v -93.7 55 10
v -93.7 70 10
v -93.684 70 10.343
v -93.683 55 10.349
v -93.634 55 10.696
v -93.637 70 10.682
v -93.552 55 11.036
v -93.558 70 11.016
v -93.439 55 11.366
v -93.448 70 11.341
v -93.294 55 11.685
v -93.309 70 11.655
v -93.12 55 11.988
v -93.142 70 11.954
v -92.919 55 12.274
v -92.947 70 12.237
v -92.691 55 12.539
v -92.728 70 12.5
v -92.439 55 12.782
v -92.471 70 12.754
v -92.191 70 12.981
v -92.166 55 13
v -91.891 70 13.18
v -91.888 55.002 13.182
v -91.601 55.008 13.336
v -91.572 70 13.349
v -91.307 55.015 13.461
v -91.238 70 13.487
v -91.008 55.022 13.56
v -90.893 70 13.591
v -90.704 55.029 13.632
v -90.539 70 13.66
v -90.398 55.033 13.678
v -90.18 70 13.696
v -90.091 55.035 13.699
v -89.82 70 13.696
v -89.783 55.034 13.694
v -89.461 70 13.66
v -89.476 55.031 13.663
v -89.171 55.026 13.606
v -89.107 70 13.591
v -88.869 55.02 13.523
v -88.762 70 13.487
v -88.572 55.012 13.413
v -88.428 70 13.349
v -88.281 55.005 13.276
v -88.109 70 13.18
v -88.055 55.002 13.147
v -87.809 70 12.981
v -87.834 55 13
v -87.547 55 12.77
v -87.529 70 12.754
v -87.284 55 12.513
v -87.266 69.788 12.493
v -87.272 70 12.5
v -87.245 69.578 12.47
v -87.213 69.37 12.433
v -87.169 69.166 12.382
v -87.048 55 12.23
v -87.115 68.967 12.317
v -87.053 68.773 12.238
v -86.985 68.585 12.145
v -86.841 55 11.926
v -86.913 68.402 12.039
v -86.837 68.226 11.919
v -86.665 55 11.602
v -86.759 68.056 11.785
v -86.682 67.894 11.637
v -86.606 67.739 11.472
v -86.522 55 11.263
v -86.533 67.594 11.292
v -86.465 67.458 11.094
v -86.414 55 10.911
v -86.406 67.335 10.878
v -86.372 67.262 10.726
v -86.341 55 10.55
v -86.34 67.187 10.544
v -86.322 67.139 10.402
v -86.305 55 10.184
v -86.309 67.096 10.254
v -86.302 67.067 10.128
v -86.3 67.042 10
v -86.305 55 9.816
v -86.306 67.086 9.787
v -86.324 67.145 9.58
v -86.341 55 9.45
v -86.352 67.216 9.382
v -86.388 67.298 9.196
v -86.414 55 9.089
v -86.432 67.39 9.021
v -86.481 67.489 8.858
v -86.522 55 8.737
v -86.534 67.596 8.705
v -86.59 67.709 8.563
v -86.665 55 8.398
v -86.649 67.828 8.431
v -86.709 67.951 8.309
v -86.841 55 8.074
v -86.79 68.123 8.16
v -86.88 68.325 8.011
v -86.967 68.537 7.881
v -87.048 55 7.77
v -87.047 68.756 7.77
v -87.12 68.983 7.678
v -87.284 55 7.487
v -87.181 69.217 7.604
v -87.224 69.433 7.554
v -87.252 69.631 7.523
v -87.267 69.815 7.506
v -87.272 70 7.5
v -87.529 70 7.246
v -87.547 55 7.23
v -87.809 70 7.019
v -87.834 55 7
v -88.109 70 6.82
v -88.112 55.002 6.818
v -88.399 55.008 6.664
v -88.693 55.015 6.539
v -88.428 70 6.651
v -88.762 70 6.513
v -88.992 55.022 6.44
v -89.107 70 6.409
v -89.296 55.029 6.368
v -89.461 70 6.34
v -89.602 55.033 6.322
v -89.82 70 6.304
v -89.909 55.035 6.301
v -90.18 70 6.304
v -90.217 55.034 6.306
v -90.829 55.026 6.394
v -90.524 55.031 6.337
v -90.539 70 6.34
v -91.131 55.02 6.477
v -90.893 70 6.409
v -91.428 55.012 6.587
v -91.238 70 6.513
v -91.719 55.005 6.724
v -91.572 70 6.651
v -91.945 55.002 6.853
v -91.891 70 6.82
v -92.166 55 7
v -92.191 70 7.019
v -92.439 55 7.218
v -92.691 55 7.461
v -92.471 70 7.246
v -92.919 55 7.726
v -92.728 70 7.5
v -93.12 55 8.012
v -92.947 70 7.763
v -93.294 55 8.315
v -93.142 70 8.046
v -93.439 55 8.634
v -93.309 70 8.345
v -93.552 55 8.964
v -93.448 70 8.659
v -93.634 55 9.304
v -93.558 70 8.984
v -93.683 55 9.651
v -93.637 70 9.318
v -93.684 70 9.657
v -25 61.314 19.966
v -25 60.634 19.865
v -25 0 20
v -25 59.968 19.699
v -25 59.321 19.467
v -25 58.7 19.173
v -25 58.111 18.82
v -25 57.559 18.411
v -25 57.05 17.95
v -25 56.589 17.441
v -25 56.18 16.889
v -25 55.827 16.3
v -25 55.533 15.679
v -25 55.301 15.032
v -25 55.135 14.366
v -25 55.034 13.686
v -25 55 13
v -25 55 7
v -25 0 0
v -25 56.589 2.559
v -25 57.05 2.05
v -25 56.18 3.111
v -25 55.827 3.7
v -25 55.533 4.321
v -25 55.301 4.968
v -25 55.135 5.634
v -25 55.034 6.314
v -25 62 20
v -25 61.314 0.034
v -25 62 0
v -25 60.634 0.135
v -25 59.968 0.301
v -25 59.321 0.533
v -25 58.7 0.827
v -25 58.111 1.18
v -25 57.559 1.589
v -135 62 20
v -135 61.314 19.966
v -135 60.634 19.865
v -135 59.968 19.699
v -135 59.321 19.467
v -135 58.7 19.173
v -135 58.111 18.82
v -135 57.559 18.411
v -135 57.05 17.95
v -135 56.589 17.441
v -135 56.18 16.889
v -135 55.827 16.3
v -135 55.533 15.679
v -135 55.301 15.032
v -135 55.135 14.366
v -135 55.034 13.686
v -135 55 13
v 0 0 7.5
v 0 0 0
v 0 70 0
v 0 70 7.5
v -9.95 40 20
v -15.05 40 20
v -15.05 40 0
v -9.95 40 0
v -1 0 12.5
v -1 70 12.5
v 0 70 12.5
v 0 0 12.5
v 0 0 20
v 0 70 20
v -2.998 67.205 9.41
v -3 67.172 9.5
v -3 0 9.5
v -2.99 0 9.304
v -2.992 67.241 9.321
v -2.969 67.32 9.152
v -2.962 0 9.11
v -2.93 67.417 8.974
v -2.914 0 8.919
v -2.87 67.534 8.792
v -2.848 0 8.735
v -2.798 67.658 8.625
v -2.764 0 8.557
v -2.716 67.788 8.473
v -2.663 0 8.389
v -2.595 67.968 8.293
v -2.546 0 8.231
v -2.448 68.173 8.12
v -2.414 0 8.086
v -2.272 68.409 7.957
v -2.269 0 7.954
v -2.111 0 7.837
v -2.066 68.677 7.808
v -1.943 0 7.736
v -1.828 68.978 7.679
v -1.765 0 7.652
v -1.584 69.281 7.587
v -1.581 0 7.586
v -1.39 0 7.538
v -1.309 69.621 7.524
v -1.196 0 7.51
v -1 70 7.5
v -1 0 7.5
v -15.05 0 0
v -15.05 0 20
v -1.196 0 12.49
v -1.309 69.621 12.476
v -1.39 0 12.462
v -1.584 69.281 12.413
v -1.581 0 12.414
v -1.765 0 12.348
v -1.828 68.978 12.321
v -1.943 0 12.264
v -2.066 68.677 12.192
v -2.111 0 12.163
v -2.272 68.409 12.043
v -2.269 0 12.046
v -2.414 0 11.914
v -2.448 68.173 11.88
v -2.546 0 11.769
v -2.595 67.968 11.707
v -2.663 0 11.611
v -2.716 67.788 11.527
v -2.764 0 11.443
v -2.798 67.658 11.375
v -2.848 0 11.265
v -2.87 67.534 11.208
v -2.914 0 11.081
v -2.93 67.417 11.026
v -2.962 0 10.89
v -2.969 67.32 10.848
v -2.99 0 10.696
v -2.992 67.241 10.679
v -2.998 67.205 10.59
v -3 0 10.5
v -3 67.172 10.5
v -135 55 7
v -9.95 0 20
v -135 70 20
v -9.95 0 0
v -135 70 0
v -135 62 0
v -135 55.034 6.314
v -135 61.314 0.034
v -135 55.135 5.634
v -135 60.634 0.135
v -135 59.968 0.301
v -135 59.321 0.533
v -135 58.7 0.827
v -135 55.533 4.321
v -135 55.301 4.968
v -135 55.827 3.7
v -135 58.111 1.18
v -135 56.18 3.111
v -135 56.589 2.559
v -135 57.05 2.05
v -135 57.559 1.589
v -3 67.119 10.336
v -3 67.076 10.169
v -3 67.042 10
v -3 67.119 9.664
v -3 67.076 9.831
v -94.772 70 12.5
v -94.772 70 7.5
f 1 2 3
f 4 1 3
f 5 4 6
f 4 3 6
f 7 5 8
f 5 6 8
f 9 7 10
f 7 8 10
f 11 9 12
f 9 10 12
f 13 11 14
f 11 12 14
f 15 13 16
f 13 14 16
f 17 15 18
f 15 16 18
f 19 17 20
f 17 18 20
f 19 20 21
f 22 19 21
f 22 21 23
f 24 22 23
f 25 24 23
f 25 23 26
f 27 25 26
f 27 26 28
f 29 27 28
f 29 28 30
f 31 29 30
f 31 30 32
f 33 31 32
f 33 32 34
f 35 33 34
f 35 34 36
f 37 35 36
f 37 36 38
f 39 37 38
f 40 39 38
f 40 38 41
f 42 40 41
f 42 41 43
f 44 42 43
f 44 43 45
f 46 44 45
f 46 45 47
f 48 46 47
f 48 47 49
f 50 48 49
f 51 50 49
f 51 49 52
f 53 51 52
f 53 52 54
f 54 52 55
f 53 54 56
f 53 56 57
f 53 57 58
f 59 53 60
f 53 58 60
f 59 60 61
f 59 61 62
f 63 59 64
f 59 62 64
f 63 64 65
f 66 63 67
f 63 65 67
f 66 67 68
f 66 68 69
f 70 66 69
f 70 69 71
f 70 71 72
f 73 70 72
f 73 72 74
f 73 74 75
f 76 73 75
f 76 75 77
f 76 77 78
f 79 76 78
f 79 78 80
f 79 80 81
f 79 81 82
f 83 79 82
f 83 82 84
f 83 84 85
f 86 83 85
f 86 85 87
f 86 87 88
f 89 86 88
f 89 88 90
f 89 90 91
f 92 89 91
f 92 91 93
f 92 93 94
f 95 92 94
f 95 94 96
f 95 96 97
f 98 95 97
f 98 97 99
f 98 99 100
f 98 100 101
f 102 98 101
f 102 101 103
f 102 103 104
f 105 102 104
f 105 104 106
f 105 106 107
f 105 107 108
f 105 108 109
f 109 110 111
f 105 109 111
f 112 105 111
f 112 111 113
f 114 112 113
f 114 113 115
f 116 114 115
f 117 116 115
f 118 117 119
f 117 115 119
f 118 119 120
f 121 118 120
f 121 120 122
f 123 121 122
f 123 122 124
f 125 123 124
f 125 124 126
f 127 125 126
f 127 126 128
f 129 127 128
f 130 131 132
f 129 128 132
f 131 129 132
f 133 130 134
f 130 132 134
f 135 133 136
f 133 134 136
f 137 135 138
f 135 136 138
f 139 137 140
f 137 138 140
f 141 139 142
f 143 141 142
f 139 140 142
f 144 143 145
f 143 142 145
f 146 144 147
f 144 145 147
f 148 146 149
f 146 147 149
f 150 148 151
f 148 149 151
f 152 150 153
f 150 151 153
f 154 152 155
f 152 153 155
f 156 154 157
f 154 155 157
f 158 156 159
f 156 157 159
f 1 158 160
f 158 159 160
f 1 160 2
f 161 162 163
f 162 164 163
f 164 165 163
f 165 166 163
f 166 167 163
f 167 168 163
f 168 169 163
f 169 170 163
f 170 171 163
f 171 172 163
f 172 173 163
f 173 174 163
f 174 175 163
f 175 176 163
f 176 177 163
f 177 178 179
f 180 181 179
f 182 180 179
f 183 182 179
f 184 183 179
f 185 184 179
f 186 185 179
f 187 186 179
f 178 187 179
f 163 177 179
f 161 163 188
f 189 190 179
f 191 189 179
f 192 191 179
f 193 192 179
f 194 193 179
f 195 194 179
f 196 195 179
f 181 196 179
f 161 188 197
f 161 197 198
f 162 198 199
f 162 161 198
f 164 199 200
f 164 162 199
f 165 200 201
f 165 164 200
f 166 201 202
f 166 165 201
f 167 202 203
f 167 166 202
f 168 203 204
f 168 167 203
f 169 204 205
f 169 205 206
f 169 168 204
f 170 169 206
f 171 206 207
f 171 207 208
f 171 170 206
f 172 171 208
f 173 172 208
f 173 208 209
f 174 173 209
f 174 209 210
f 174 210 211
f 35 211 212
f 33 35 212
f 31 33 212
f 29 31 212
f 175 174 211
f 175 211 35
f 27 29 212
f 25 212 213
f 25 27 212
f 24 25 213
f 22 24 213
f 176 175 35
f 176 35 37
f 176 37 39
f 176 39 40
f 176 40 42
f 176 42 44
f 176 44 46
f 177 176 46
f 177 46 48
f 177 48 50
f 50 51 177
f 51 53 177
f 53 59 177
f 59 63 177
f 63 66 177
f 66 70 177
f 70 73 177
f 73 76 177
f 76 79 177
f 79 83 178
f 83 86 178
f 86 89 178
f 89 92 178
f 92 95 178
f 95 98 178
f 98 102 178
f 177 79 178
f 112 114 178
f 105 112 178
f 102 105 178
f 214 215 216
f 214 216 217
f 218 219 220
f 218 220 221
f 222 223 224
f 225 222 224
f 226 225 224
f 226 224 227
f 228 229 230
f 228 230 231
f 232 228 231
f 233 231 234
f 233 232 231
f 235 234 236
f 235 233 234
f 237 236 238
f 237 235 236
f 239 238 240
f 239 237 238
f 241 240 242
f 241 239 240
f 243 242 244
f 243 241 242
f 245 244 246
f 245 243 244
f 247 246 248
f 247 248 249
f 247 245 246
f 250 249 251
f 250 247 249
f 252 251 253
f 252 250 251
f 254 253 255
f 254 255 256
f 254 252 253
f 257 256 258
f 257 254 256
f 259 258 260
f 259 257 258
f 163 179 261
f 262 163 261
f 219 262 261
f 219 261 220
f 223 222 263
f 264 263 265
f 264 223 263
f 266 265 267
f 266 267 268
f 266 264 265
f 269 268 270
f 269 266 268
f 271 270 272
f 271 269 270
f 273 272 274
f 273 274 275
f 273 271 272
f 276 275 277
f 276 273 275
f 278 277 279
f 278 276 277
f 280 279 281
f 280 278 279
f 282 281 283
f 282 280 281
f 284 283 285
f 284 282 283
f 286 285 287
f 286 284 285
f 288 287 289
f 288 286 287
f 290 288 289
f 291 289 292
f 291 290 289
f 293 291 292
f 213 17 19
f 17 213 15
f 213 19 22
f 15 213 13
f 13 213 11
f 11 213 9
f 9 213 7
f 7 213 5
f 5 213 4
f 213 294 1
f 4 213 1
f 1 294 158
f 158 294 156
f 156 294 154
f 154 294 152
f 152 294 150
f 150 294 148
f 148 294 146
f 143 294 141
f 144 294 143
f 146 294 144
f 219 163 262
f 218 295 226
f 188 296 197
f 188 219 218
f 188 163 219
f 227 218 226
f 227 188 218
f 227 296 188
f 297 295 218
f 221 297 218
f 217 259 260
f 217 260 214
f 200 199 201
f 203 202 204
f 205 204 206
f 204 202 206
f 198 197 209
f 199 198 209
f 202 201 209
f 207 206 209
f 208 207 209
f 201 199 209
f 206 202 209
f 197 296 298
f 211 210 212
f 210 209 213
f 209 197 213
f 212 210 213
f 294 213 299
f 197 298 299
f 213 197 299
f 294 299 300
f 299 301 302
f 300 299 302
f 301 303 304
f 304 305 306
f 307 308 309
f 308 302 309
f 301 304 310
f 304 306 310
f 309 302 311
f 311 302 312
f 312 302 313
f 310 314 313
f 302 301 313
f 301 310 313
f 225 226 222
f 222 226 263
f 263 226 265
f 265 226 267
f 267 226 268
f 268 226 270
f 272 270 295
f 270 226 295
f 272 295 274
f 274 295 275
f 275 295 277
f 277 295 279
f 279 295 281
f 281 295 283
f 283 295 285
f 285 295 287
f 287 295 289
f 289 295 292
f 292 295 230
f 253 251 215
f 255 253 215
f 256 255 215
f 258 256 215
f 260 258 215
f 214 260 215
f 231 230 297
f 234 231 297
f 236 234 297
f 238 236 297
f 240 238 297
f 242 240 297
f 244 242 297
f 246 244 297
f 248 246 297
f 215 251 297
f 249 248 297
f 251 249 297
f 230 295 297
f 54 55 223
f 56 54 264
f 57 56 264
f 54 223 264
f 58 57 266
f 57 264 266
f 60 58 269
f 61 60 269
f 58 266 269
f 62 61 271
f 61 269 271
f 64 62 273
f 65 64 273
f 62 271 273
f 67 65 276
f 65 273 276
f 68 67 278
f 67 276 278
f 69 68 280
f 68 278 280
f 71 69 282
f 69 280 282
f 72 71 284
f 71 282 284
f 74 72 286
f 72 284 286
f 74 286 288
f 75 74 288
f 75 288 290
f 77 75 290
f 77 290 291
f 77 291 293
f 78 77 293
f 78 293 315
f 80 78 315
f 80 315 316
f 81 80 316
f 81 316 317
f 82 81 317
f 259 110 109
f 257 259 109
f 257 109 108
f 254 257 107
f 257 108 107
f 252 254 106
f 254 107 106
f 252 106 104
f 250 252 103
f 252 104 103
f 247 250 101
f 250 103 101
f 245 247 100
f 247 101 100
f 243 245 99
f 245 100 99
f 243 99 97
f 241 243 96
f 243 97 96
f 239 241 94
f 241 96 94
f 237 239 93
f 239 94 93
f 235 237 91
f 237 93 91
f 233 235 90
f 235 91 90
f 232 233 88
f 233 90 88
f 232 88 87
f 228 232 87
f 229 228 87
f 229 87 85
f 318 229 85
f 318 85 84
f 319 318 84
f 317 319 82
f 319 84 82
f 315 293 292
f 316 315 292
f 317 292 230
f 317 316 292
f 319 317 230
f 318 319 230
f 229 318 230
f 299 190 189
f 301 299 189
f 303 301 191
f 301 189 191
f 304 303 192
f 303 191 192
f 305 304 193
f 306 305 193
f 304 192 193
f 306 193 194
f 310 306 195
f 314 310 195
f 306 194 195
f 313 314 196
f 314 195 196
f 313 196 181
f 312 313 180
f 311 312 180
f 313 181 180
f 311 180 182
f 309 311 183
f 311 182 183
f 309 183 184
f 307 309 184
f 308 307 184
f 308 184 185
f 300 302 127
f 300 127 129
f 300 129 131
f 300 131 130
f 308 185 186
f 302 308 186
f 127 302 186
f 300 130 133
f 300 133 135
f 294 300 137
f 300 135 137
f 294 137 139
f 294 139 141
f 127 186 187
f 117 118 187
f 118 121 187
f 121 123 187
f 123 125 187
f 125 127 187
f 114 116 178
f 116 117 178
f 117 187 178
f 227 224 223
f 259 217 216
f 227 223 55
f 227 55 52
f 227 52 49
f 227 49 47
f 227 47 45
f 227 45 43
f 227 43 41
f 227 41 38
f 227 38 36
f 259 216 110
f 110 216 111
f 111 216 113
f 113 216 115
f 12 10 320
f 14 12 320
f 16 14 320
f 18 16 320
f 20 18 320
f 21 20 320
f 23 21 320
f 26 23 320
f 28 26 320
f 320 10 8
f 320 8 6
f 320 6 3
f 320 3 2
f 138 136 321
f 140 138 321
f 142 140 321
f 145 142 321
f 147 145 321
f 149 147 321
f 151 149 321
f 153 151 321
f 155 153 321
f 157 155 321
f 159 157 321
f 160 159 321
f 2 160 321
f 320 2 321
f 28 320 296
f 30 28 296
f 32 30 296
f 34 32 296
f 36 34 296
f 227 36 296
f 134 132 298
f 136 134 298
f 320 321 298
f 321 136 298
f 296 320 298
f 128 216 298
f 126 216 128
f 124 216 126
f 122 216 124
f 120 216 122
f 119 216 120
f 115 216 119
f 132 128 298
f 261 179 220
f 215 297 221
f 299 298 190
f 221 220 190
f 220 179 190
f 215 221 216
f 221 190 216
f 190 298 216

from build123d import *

# Parameters (mm, degrees)
BOSS_EXTRUDE1_DEPTH = 20
SKETCH2_W           = 5.1
SKETCH2_H           = 40
CUT_EXTRUDE1_DEPTH  = 20
FILLET1_R           = 7
CUT_EXTRUDE3_REACH  = 155.379
SKETCH5_R           = 3.7
SKETCH6_W           = 87.272363661
SKETCH6_H           = 5
CUT_EXTRUDE4_DEPTH  = 3
FILLET2_R           = 3
SKETCH7_W           = 3
SKETCH7_H           = 5
CUT_EXTRUDE5_DEPTH  = 70
FILLET3_R           = 2


with BuildPart() as part:
    # Sketch1 → Boss-Extrude1 (new body)
    with BuildSketch(Plane.XY):
        Polygon((0, 0), (0, 70), (-135, 70), (-135, 55), (-25, 55), (-25, 0), align=None)
    extrude(amount=BOSS_EXTRUDE1_DEPTH)

    # Sketch2 → Cut-Extrude1 (cut)
    with BuildSketch(Plane.XY.offset(20)):
        with Locations((-12.5, 20)):
            Rectangle(SKETCH2_W, SKETCH2_H)
    extrude(amount=-CUT_EXTRUDE1_DEPTH, mode=Mode.SUBTRACT)

    # Fillet1
    fillet1_edges = [part.edges().sort_by_distance(p)[0] for p in [
        (-80, 55, 20),
        (-80, 55, 0),
    ]]
    fillet(fillet1_edges, radius=FILLET1_R)

    # Cut-Extrude3: up to this face of the body (flat: up to its plane)
    cut_extrude3_end = Plane(part.part.faces().sort_by_distance((-80, 55, 10))[0])
    # Sketch5 → Cut-Extrude3 (cut, up to the picked face)
    with BuildSketch(Plane(origin=(0, 70, 0), x_dir=(1, 0, 0), z_dir=(0, 1, 0)), mode=Mode.PRIVATE) as cut_extrude3_sk1:
        with Locations(Location((-90, -10, 0), (0, 0, 180))):
            Circle(SKETCH5_R)
    cut_extrude3_tool1 = split(extrude(cut_extrude3_sk1.sketch, amount=-CUT_EXTRUDE3_REACH, mode=Mode.PRIVATE), bisect_by=cut_extrude3_end, keep=Keep.BOTH, mode=Mode.PRIVATE)
    add(cut_extrude3_tool1.solids().sort_by(Axis((-90, 70, 10), (0, -1, 0)))[0], mode=Mode.SUBTRACT)

    # Sketch6 → Cut-Extrude4 (cut)
    with BuildSketch(Plane(origin=(0, 70, 0), x_dir=(1, 0, 0), z_dir=(0, 1, 0))):
        with Locations((-43.63618183, -10)):
            Rectangle(SKETCH6_W, SKETCH6_H)
    extrude(amount=-CUT_EXTRUDE4_DEPTH, mode=Mode.SUBTRACT)

    # Fillet2
    # the kernel refuses this fillet: 3 mm, written as the material it adds along each edge
    with BuildSketch(Plane(origin=(0, 67, 12.5), x_dir=(0, 0, -1), z_dir=(-1, 0, 0))) as fillet2_piece_1_section:
        with BuildLine():
            CenterArc((FILLET2_R, -FILLET2_R), FILLET2_R, 90, 90)
            Line((0, -FILLET2_R), (0, 0))
            Line((0, 0), (FILLET2_R, 0))
        make_face()
    fillet2_piece_1 = extrude(amount=94.772363661, mode=Mode.PRIVATE)
    fillet2_piece_1 = fillet2_piece_1 - Plane(origin=(-90, 67.680644159, 10), x_dir=(-1, 0, 0), z_dir=(0, 1, 0)) * Cylinder(3.7, 202, mode=Mode.PRIVATE)
    add(fillet2_piece_1)
    with BuildSketch(Plane(origin=(-94.772363661, 67, 7.5), x_dir=(0, 1, 0), z_dir=(1, 0, 0))) as fillet2_piece_2_section:
        with BuildLine():
            CenterArc((FILLET2_R, FILLET2_R), FILLET2_R, 180, 90)
            Line((0, FILLET2_R), (0, 0))
            Line((0, 0), (FILLET2_R, 0))
        make_face()
    fillet2_piece_2 = extrude(amount=94.772363661, mode=Mode.PRIVATE)
    fillet2_piece_2 = fillet2_piece_2 - Plane(origin=(-90, 67.756833616, 10), x_dir=(-1, 0, 0), z_dir=(0, 1, 0)) * Cylinder(3.7, 202, mode=Mode.PRIVATE)
    add(fillet2_piece_2)

    # Sketch7 → Cut-Extrude5 (cut)
    with BuildSketch(Plane(origin=(0, 70, 0), x_dir=(1, 0, 0), z_dir=(0, 1, 0))):
        with Locations((-1.5, -10)):
            Rectangle(SKETCH7_W, SKETCH7_H)
    extrude(amount=-CUT_EXTRUDE5_DEPTH, mode=Mode.SUBTRACT)

    # Fillet3
    # the kernel refuses this fillet: 2 mm, written as the material it adds along each edge
    with BuildSketch(Plane(origin=(-3, 70, 12.5), x_dir=(0, 0, -1), z_dir=(0, -1, 0))) as fillet3_piece_1_section:
        with BuildLine():
            CenterArc((FILLET3_R, FILLET3_R), FILLET3_R, 180, 90)
            Line((0, FILLET3_R), (0, 0))
            Line((0, 0), (FILLET3_R, 0))
        make_face()
    fillet3_piece_1 = extrude(amount=70, mode=Mode.PRIVATE)
    fillet3_piece_1 = fillet3_piece_1 - Plane(origin=(-2.544196541, 70, 9.5), x_dir=(0, 0, -1), z_dir=(1, 0, 0)) * Cylinder(3, 148, mode=Mode.PRIVATE)
    add(fillet3_piece_1)
    with BuildSketch(Plane(origin=(-3, 70, 7.5), x_dir=(0, 0, 1), z_dir=(0, -1, 0))) as fillet3_piece_2_section:
        with BuildLine():
            CenterArc((FILLET3_R, -FILLET3_R), FILLET3_R, 90, 90)
            Line((0, -FILLET3_R), (0, 0))
            Line((0, 0), (FILLET3_R, 0))
        make_face()
    fillet3_piece_2 = extrude(amount=70, mode=Mode.PRIVATE)
    fillet3_piece_2 = fillet3_piece_2 - Plane(origin=(-2.544196926, 70, 10.5), x_dir=(0, 1, 0), z_dir=(-1, 0, 0)) * Cylinder(3, 148, mode=Mode.PRIVATE)
    add(fillet3_piece_2)


solid = part.part
